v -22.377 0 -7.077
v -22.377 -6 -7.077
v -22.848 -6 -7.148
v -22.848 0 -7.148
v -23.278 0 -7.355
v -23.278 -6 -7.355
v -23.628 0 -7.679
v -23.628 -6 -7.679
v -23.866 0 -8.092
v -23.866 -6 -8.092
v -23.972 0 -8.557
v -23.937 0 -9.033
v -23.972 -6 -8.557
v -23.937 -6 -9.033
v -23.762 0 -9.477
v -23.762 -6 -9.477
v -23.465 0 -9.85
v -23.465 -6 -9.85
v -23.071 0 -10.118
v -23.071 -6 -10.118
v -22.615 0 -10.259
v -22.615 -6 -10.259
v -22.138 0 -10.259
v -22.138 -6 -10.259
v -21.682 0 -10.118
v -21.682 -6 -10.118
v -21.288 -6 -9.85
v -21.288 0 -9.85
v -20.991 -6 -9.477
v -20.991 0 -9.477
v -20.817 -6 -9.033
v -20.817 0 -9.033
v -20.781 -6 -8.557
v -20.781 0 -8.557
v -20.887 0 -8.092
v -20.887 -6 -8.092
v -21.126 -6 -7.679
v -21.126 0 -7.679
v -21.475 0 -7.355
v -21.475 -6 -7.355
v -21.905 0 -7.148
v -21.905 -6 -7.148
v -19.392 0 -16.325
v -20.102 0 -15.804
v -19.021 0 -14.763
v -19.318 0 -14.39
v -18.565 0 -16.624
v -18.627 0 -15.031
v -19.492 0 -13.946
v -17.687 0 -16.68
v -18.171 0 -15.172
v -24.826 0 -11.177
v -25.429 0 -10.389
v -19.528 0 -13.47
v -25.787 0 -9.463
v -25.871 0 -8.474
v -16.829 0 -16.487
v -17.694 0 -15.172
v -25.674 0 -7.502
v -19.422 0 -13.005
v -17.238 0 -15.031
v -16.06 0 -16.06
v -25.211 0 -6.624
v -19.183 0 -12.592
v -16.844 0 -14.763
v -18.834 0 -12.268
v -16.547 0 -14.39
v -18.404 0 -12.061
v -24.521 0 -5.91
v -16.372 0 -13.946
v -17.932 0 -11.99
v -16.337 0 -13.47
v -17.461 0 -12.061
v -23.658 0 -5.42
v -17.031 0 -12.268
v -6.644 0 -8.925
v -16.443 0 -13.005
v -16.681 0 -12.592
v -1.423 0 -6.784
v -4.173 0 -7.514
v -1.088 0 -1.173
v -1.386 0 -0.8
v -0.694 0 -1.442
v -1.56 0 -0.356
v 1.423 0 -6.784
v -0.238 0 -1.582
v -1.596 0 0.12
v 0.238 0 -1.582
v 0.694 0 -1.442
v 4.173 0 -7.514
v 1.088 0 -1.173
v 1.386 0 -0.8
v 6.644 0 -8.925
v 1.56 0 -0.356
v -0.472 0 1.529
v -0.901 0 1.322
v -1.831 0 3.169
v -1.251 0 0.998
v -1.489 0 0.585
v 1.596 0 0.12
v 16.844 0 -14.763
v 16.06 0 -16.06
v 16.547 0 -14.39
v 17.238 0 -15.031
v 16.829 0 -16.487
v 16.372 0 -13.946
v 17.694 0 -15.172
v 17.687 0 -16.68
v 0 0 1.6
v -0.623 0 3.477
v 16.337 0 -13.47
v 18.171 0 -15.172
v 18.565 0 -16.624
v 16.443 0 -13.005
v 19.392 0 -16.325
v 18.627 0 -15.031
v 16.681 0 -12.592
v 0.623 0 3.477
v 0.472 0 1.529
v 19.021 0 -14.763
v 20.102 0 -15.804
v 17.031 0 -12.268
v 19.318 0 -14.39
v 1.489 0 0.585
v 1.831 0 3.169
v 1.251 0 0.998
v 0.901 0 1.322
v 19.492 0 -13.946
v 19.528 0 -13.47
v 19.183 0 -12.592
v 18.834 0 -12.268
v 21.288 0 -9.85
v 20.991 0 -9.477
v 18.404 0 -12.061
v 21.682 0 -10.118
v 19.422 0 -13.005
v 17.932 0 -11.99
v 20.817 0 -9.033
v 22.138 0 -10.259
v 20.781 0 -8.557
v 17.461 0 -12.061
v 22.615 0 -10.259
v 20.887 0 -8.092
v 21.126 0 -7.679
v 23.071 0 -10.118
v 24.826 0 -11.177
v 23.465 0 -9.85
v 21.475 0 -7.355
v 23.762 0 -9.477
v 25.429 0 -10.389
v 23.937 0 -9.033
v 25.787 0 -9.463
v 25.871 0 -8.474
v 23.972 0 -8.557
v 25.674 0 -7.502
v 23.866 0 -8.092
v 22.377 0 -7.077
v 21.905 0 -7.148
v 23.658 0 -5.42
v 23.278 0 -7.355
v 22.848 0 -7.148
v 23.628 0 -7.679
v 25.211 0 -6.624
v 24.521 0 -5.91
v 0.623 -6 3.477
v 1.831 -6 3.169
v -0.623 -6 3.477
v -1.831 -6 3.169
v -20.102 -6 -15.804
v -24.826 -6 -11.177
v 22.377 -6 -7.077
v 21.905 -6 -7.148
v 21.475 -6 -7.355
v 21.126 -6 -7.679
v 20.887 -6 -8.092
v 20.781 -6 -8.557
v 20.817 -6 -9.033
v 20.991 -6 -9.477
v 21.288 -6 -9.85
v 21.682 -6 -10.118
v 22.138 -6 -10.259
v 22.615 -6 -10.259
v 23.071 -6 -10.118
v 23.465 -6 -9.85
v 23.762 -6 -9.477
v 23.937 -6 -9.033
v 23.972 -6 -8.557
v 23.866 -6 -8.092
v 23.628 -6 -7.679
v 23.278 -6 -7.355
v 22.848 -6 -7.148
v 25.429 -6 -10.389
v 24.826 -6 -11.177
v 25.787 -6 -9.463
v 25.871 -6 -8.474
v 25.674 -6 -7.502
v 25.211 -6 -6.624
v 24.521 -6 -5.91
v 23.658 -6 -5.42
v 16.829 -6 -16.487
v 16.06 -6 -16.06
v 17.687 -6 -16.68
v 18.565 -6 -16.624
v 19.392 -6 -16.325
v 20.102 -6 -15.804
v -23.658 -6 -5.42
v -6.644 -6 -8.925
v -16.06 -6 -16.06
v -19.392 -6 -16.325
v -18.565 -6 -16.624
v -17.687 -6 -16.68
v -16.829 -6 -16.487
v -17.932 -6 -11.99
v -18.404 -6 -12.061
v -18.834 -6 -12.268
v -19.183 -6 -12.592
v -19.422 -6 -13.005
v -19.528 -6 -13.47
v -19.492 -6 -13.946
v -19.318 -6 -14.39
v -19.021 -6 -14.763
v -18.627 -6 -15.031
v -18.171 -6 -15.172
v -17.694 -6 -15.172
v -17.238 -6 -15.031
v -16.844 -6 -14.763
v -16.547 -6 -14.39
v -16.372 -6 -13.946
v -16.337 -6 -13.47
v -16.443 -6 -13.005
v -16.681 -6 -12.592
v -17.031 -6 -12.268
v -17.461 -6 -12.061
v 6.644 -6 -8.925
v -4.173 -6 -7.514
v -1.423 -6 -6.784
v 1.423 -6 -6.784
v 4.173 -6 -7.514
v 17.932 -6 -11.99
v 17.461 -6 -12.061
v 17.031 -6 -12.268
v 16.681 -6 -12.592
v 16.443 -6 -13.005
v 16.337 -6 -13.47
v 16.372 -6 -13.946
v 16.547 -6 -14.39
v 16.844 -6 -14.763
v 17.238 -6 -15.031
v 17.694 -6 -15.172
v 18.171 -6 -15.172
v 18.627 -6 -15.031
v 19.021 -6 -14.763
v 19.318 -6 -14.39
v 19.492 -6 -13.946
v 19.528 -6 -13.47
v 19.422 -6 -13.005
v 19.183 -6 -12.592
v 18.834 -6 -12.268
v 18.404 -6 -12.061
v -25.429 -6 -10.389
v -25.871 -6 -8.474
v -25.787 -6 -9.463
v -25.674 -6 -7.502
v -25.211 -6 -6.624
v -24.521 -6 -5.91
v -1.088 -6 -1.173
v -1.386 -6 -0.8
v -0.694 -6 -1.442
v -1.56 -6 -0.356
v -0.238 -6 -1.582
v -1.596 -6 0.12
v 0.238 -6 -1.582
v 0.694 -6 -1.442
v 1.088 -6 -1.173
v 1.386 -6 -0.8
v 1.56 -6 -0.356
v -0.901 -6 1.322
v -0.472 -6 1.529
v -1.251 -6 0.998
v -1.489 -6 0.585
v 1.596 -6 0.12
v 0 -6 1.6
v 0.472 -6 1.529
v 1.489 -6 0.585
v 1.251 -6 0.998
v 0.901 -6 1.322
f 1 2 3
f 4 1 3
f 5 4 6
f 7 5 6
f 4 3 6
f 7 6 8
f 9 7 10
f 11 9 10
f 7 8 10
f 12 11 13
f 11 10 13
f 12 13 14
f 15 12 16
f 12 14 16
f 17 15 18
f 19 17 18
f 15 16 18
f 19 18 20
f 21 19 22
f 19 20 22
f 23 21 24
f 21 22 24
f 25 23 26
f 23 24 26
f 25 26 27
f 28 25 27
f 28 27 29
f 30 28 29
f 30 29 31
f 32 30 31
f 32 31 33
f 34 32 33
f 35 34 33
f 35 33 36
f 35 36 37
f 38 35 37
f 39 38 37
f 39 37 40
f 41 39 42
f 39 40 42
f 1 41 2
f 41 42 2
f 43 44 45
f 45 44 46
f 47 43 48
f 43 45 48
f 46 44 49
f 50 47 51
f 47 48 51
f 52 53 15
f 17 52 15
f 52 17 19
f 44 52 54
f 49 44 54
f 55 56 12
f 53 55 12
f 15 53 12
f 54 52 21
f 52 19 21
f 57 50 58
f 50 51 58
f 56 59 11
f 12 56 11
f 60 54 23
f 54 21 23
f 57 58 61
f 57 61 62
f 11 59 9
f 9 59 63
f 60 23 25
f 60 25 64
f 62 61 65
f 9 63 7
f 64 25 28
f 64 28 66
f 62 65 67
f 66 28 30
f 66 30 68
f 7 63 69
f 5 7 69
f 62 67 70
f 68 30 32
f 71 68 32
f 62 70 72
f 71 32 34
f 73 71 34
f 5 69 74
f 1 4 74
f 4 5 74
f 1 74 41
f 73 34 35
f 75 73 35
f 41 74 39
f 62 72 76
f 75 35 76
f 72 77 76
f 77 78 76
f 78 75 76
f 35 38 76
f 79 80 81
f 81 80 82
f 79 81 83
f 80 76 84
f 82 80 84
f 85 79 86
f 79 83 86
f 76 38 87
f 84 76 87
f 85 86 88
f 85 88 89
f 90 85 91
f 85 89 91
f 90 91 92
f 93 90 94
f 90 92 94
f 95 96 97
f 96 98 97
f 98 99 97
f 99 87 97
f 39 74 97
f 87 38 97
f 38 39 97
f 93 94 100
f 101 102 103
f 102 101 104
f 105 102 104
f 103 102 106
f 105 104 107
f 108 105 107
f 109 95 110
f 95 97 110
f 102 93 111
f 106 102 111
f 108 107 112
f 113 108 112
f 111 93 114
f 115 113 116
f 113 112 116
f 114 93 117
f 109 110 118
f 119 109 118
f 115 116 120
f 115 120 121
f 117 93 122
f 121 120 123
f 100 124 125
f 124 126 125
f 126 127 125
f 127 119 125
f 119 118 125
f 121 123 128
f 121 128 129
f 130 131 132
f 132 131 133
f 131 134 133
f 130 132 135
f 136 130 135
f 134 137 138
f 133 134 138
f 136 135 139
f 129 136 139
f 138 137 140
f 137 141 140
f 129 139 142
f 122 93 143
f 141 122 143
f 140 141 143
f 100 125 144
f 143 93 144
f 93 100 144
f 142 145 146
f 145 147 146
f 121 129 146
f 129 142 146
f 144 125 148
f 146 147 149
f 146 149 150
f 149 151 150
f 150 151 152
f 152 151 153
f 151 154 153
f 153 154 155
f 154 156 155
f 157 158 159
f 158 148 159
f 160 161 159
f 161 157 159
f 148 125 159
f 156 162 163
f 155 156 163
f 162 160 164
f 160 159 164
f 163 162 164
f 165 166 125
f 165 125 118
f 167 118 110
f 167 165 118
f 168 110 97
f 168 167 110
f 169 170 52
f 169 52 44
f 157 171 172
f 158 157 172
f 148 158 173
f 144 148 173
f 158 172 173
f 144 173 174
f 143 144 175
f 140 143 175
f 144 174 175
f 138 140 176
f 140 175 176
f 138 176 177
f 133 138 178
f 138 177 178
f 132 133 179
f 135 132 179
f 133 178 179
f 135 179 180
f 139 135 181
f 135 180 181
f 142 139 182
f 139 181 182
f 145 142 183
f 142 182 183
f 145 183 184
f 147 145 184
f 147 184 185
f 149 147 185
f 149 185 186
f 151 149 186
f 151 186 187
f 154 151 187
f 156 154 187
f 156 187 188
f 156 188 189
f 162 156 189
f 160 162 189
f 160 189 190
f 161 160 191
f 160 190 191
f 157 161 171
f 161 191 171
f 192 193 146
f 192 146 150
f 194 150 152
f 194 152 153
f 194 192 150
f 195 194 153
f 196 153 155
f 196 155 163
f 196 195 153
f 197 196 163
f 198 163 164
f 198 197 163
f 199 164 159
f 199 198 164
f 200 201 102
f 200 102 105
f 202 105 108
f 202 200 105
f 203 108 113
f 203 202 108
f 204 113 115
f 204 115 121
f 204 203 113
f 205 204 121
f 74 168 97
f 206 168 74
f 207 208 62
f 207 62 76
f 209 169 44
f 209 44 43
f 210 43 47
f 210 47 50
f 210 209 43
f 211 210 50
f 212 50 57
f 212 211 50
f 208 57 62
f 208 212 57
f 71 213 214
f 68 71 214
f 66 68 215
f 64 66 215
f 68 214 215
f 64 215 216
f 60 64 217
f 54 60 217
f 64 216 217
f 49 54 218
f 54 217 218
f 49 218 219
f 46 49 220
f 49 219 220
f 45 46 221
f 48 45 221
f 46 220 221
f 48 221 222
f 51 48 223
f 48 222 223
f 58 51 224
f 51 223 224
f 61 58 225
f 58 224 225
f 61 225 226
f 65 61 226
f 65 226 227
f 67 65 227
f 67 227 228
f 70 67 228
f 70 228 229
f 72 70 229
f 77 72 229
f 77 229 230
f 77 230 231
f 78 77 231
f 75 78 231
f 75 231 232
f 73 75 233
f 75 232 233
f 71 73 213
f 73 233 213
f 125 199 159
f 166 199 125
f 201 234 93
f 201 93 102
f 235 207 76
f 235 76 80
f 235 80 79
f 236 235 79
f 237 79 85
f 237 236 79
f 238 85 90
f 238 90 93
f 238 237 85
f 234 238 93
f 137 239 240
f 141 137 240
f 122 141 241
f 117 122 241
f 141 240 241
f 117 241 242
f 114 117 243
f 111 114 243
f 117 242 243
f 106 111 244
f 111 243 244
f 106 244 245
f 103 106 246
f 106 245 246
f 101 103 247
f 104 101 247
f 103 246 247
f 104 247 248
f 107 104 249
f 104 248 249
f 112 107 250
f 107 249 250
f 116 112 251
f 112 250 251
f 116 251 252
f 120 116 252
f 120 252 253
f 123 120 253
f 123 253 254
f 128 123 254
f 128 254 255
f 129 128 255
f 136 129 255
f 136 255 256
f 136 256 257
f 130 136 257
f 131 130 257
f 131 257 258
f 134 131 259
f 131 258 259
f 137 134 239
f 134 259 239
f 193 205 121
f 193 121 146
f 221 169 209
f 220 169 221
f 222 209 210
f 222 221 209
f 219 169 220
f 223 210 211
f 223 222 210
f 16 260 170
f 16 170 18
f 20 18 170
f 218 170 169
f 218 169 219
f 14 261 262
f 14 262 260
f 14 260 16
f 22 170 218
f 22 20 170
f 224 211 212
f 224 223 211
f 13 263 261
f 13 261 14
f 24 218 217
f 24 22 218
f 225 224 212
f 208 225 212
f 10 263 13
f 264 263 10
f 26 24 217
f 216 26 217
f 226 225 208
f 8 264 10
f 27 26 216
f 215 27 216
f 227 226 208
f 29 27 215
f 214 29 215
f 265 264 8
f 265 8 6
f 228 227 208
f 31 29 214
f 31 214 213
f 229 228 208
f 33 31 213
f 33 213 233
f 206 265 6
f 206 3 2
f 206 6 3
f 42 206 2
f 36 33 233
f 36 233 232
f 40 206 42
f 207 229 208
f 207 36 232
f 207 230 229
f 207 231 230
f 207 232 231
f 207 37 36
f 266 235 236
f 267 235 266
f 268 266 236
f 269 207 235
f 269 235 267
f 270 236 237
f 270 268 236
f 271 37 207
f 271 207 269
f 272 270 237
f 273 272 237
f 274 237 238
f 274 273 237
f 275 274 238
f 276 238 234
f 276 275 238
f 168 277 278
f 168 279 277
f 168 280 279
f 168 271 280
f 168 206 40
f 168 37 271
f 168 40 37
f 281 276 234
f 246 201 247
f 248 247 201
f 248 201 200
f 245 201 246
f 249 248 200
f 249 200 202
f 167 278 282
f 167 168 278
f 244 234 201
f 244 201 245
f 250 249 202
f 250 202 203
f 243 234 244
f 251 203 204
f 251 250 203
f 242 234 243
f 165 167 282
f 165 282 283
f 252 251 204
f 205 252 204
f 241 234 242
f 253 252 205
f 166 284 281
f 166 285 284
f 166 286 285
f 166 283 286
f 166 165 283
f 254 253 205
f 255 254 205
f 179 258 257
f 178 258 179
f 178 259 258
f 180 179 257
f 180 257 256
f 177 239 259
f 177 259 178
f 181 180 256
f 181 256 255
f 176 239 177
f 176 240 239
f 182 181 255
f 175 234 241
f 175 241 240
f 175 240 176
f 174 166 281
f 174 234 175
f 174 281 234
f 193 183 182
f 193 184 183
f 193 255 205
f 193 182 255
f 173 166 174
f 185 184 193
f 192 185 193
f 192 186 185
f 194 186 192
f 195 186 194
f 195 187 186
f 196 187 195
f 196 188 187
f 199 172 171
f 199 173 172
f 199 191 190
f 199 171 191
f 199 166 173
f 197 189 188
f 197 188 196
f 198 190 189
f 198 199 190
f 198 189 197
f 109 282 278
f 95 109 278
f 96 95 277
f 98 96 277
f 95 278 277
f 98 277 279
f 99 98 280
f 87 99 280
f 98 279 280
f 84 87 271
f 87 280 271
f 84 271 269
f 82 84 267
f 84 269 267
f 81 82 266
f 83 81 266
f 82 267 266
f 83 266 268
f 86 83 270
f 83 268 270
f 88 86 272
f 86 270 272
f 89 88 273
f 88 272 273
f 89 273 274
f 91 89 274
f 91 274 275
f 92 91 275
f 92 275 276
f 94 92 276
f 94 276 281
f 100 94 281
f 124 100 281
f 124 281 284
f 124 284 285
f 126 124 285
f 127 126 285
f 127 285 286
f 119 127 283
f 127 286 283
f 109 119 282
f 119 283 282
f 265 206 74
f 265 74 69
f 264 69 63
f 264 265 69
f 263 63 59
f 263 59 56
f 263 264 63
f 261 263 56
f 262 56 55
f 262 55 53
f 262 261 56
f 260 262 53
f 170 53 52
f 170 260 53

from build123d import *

# Parameters (mm, degrees)
ESBO_O1_R                = 1.6
RESSALTO_EXTRUS_O1_DEPTH = 6


with BuildPart() as part:
    # Esboço1 → Ressalto-extrusão1 (new body)
    with BuildSketch(Plane.XZ.offset(6)):
        with BuildLine():
            Line((23.658239146, -5.419790473), (1.830835365, 3.169198905))
            ThreePointArc((1.830835365, 3.169198905), (0, 3.516453278), (-1.830835365, 3.169198905))
            Line((-1.830835365, 3.169198905), (-23.658239146, -5.419790473))
            ThreePointArc((-23.658239146, -5.419790473), (-25.806836409, -7.98111819), (-24.825744035, -11.177104364))
            Line((-24.825744035, -11.177104364), (-20.101514858, -15.804403192))
            ThreePointArc((-20.101514858, -15.804403192), (-18.128320556, -16.683568025), (-16.059952818, -16.060445681))
            Line((-16.059952818, -16.060445681), (-6.643887712, -8.924606384))
            ThreePointArc((-6.643887712, -8.924606384), (0, -6.691518958), (6.643887712, -8.924606384))
            Line((6.643887712, -8.924606384), (16.059952818, -16.060445681))
            ThreePointArc((16.059952818, -16.060445681), (18.128320556, -16.683568025), (20.101514858, -15.804403192))
            Line((20.101514858, -15.804403192), (24.825744035, -11.177104364))
            ThreePointArc((24.825744035, -11.177104364), (25.806836409, -7.98111819), (23.658239146, -5.419790473))
        make_face()
        with Locations(Location((-17.932321173, -13.589770319, 0), (0, 0, 90))):
            Circle(ESBO_O1_R, mode=Mode.SUBTRACT)
        with Locations(Location((0, 0, 0), (0, 0, 90))):
            Circle(ESBO_O1_R, mode=Mode.SUBTRACT)
        with Locations(Location((17.932321173, -13.589770319, 0), (0, 0, 90))):
            Circle(ESBO_O1_R, mode=Mode.SUBTRACT)
        with Locations(Location((-22.376654391, -8.676712411, 0), (0, 0, 90))):
            Circle(ESBO_O1_R, mode=Mode.SUBTRACT)
        with Locations(Location((22.376654391, -8.676712411, 0), (0, 0, 90))):
            Circle(ESBO_O1_R, mode=Mode.SUBTRACT)
    extrude(amount=-RESSALTO_EXTRUS_O1_DEPTH)


solid = part.part
